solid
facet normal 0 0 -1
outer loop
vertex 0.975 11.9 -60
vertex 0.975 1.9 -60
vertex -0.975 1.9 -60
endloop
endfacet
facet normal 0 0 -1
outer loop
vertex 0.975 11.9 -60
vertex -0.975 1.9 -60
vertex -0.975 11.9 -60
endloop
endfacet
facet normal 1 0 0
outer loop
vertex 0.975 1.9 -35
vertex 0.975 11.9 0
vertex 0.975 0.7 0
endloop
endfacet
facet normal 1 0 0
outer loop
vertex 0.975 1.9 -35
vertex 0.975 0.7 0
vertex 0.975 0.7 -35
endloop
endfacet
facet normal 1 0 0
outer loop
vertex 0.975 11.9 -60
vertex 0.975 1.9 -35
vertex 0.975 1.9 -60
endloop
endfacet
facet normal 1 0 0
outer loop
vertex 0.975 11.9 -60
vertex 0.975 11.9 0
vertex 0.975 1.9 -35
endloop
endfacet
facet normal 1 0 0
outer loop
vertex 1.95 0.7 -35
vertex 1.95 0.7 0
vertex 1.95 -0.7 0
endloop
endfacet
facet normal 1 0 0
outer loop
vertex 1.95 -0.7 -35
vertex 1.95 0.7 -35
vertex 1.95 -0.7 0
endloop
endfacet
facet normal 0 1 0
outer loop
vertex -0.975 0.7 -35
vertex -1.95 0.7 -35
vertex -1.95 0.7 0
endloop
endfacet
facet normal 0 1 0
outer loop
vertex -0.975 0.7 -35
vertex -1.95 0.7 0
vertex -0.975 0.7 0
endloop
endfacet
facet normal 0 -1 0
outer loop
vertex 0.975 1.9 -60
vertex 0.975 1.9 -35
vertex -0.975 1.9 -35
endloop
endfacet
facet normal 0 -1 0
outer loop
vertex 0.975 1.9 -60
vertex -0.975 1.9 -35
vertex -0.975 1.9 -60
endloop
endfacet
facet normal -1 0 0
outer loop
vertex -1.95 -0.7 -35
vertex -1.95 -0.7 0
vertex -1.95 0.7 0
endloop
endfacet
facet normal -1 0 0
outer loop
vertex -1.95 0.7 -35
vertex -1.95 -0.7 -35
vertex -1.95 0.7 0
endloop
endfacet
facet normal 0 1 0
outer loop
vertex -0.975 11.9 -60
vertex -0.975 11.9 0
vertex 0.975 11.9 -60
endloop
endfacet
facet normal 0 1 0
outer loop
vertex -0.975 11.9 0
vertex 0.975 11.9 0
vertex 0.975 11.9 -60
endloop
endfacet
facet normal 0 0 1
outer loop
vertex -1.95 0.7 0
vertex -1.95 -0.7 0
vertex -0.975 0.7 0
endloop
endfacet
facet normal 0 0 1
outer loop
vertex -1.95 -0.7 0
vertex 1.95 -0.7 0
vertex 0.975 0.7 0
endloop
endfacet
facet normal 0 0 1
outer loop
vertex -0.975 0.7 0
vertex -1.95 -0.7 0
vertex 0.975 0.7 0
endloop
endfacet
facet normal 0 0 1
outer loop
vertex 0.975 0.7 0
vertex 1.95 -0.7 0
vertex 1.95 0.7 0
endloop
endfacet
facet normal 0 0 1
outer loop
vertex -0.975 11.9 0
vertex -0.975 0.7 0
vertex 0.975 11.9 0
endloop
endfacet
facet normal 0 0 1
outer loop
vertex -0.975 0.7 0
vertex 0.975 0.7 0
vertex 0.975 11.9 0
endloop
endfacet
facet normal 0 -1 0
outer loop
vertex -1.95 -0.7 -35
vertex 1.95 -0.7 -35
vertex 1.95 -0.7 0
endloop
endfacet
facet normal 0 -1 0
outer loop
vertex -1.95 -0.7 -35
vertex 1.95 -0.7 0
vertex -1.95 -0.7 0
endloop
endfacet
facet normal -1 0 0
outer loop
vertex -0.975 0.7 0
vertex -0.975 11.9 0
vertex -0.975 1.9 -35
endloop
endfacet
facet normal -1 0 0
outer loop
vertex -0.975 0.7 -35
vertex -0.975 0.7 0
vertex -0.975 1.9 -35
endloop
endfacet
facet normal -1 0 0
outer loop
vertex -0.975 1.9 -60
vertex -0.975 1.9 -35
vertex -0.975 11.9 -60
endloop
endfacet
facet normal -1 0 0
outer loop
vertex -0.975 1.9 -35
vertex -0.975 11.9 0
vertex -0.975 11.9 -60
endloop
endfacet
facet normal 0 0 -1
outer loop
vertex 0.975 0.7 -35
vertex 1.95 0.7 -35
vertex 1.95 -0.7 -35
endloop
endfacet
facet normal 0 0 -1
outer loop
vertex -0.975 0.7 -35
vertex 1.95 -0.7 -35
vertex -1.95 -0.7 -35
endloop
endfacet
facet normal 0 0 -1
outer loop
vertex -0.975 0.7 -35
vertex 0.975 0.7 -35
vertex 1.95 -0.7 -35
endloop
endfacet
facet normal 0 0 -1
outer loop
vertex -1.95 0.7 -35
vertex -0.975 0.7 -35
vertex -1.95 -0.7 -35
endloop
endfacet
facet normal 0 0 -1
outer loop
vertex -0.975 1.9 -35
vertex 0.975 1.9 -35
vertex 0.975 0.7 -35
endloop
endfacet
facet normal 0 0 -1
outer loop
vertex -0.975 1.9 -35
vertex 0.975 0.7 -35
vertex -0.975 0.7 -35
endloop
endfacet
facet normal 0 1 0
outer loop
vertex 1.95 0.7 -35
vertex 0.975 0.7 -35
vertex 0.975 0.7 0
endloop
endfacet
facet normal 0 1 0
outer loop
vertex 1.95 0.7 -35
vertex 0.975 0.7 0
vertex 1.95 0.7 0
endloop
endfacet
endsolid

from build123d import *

# Parameters (mm, degrees)
SALIENTE_EXTRUIR1_DEPTH = 35
CROQUIS9_W              = 60
CROQUIS9_H              = 10
SALIENTE_EXTRUIR2_DEPTH = 0.975


with BuildPart() as part:
    # Croquis1 → Saliente-Extruir1 (new body)
    with BuildSketch(Plane.XY):
        Polygon((-1.95, -0.7), (-1.95, 0.7), (-0.975, 0.7), (-0.975, 1.9), (0.975, 1.9), (0.975, 0.7), (1.95, 0.7), (1.95, -0.7), align=None)
    extrude(amount=-SALIENTE_EXTRUIR1_DEPTH)

    # Croquis9 → Saliente-Extruir2 (add, symmetric)
    with BuildSketch(Plane(origin=(0, 0, 0), x_dir=(0, 0, -1), z_dir=(1, 0, 0))):
        with Locations((30, 6.9)):
            Rectangle(CROQUIS9_W, CROQUIS9_H)
    extrude(amount=SALIENTE_EXTRUIR2_DEPTH, both=True)


solid = part.part
